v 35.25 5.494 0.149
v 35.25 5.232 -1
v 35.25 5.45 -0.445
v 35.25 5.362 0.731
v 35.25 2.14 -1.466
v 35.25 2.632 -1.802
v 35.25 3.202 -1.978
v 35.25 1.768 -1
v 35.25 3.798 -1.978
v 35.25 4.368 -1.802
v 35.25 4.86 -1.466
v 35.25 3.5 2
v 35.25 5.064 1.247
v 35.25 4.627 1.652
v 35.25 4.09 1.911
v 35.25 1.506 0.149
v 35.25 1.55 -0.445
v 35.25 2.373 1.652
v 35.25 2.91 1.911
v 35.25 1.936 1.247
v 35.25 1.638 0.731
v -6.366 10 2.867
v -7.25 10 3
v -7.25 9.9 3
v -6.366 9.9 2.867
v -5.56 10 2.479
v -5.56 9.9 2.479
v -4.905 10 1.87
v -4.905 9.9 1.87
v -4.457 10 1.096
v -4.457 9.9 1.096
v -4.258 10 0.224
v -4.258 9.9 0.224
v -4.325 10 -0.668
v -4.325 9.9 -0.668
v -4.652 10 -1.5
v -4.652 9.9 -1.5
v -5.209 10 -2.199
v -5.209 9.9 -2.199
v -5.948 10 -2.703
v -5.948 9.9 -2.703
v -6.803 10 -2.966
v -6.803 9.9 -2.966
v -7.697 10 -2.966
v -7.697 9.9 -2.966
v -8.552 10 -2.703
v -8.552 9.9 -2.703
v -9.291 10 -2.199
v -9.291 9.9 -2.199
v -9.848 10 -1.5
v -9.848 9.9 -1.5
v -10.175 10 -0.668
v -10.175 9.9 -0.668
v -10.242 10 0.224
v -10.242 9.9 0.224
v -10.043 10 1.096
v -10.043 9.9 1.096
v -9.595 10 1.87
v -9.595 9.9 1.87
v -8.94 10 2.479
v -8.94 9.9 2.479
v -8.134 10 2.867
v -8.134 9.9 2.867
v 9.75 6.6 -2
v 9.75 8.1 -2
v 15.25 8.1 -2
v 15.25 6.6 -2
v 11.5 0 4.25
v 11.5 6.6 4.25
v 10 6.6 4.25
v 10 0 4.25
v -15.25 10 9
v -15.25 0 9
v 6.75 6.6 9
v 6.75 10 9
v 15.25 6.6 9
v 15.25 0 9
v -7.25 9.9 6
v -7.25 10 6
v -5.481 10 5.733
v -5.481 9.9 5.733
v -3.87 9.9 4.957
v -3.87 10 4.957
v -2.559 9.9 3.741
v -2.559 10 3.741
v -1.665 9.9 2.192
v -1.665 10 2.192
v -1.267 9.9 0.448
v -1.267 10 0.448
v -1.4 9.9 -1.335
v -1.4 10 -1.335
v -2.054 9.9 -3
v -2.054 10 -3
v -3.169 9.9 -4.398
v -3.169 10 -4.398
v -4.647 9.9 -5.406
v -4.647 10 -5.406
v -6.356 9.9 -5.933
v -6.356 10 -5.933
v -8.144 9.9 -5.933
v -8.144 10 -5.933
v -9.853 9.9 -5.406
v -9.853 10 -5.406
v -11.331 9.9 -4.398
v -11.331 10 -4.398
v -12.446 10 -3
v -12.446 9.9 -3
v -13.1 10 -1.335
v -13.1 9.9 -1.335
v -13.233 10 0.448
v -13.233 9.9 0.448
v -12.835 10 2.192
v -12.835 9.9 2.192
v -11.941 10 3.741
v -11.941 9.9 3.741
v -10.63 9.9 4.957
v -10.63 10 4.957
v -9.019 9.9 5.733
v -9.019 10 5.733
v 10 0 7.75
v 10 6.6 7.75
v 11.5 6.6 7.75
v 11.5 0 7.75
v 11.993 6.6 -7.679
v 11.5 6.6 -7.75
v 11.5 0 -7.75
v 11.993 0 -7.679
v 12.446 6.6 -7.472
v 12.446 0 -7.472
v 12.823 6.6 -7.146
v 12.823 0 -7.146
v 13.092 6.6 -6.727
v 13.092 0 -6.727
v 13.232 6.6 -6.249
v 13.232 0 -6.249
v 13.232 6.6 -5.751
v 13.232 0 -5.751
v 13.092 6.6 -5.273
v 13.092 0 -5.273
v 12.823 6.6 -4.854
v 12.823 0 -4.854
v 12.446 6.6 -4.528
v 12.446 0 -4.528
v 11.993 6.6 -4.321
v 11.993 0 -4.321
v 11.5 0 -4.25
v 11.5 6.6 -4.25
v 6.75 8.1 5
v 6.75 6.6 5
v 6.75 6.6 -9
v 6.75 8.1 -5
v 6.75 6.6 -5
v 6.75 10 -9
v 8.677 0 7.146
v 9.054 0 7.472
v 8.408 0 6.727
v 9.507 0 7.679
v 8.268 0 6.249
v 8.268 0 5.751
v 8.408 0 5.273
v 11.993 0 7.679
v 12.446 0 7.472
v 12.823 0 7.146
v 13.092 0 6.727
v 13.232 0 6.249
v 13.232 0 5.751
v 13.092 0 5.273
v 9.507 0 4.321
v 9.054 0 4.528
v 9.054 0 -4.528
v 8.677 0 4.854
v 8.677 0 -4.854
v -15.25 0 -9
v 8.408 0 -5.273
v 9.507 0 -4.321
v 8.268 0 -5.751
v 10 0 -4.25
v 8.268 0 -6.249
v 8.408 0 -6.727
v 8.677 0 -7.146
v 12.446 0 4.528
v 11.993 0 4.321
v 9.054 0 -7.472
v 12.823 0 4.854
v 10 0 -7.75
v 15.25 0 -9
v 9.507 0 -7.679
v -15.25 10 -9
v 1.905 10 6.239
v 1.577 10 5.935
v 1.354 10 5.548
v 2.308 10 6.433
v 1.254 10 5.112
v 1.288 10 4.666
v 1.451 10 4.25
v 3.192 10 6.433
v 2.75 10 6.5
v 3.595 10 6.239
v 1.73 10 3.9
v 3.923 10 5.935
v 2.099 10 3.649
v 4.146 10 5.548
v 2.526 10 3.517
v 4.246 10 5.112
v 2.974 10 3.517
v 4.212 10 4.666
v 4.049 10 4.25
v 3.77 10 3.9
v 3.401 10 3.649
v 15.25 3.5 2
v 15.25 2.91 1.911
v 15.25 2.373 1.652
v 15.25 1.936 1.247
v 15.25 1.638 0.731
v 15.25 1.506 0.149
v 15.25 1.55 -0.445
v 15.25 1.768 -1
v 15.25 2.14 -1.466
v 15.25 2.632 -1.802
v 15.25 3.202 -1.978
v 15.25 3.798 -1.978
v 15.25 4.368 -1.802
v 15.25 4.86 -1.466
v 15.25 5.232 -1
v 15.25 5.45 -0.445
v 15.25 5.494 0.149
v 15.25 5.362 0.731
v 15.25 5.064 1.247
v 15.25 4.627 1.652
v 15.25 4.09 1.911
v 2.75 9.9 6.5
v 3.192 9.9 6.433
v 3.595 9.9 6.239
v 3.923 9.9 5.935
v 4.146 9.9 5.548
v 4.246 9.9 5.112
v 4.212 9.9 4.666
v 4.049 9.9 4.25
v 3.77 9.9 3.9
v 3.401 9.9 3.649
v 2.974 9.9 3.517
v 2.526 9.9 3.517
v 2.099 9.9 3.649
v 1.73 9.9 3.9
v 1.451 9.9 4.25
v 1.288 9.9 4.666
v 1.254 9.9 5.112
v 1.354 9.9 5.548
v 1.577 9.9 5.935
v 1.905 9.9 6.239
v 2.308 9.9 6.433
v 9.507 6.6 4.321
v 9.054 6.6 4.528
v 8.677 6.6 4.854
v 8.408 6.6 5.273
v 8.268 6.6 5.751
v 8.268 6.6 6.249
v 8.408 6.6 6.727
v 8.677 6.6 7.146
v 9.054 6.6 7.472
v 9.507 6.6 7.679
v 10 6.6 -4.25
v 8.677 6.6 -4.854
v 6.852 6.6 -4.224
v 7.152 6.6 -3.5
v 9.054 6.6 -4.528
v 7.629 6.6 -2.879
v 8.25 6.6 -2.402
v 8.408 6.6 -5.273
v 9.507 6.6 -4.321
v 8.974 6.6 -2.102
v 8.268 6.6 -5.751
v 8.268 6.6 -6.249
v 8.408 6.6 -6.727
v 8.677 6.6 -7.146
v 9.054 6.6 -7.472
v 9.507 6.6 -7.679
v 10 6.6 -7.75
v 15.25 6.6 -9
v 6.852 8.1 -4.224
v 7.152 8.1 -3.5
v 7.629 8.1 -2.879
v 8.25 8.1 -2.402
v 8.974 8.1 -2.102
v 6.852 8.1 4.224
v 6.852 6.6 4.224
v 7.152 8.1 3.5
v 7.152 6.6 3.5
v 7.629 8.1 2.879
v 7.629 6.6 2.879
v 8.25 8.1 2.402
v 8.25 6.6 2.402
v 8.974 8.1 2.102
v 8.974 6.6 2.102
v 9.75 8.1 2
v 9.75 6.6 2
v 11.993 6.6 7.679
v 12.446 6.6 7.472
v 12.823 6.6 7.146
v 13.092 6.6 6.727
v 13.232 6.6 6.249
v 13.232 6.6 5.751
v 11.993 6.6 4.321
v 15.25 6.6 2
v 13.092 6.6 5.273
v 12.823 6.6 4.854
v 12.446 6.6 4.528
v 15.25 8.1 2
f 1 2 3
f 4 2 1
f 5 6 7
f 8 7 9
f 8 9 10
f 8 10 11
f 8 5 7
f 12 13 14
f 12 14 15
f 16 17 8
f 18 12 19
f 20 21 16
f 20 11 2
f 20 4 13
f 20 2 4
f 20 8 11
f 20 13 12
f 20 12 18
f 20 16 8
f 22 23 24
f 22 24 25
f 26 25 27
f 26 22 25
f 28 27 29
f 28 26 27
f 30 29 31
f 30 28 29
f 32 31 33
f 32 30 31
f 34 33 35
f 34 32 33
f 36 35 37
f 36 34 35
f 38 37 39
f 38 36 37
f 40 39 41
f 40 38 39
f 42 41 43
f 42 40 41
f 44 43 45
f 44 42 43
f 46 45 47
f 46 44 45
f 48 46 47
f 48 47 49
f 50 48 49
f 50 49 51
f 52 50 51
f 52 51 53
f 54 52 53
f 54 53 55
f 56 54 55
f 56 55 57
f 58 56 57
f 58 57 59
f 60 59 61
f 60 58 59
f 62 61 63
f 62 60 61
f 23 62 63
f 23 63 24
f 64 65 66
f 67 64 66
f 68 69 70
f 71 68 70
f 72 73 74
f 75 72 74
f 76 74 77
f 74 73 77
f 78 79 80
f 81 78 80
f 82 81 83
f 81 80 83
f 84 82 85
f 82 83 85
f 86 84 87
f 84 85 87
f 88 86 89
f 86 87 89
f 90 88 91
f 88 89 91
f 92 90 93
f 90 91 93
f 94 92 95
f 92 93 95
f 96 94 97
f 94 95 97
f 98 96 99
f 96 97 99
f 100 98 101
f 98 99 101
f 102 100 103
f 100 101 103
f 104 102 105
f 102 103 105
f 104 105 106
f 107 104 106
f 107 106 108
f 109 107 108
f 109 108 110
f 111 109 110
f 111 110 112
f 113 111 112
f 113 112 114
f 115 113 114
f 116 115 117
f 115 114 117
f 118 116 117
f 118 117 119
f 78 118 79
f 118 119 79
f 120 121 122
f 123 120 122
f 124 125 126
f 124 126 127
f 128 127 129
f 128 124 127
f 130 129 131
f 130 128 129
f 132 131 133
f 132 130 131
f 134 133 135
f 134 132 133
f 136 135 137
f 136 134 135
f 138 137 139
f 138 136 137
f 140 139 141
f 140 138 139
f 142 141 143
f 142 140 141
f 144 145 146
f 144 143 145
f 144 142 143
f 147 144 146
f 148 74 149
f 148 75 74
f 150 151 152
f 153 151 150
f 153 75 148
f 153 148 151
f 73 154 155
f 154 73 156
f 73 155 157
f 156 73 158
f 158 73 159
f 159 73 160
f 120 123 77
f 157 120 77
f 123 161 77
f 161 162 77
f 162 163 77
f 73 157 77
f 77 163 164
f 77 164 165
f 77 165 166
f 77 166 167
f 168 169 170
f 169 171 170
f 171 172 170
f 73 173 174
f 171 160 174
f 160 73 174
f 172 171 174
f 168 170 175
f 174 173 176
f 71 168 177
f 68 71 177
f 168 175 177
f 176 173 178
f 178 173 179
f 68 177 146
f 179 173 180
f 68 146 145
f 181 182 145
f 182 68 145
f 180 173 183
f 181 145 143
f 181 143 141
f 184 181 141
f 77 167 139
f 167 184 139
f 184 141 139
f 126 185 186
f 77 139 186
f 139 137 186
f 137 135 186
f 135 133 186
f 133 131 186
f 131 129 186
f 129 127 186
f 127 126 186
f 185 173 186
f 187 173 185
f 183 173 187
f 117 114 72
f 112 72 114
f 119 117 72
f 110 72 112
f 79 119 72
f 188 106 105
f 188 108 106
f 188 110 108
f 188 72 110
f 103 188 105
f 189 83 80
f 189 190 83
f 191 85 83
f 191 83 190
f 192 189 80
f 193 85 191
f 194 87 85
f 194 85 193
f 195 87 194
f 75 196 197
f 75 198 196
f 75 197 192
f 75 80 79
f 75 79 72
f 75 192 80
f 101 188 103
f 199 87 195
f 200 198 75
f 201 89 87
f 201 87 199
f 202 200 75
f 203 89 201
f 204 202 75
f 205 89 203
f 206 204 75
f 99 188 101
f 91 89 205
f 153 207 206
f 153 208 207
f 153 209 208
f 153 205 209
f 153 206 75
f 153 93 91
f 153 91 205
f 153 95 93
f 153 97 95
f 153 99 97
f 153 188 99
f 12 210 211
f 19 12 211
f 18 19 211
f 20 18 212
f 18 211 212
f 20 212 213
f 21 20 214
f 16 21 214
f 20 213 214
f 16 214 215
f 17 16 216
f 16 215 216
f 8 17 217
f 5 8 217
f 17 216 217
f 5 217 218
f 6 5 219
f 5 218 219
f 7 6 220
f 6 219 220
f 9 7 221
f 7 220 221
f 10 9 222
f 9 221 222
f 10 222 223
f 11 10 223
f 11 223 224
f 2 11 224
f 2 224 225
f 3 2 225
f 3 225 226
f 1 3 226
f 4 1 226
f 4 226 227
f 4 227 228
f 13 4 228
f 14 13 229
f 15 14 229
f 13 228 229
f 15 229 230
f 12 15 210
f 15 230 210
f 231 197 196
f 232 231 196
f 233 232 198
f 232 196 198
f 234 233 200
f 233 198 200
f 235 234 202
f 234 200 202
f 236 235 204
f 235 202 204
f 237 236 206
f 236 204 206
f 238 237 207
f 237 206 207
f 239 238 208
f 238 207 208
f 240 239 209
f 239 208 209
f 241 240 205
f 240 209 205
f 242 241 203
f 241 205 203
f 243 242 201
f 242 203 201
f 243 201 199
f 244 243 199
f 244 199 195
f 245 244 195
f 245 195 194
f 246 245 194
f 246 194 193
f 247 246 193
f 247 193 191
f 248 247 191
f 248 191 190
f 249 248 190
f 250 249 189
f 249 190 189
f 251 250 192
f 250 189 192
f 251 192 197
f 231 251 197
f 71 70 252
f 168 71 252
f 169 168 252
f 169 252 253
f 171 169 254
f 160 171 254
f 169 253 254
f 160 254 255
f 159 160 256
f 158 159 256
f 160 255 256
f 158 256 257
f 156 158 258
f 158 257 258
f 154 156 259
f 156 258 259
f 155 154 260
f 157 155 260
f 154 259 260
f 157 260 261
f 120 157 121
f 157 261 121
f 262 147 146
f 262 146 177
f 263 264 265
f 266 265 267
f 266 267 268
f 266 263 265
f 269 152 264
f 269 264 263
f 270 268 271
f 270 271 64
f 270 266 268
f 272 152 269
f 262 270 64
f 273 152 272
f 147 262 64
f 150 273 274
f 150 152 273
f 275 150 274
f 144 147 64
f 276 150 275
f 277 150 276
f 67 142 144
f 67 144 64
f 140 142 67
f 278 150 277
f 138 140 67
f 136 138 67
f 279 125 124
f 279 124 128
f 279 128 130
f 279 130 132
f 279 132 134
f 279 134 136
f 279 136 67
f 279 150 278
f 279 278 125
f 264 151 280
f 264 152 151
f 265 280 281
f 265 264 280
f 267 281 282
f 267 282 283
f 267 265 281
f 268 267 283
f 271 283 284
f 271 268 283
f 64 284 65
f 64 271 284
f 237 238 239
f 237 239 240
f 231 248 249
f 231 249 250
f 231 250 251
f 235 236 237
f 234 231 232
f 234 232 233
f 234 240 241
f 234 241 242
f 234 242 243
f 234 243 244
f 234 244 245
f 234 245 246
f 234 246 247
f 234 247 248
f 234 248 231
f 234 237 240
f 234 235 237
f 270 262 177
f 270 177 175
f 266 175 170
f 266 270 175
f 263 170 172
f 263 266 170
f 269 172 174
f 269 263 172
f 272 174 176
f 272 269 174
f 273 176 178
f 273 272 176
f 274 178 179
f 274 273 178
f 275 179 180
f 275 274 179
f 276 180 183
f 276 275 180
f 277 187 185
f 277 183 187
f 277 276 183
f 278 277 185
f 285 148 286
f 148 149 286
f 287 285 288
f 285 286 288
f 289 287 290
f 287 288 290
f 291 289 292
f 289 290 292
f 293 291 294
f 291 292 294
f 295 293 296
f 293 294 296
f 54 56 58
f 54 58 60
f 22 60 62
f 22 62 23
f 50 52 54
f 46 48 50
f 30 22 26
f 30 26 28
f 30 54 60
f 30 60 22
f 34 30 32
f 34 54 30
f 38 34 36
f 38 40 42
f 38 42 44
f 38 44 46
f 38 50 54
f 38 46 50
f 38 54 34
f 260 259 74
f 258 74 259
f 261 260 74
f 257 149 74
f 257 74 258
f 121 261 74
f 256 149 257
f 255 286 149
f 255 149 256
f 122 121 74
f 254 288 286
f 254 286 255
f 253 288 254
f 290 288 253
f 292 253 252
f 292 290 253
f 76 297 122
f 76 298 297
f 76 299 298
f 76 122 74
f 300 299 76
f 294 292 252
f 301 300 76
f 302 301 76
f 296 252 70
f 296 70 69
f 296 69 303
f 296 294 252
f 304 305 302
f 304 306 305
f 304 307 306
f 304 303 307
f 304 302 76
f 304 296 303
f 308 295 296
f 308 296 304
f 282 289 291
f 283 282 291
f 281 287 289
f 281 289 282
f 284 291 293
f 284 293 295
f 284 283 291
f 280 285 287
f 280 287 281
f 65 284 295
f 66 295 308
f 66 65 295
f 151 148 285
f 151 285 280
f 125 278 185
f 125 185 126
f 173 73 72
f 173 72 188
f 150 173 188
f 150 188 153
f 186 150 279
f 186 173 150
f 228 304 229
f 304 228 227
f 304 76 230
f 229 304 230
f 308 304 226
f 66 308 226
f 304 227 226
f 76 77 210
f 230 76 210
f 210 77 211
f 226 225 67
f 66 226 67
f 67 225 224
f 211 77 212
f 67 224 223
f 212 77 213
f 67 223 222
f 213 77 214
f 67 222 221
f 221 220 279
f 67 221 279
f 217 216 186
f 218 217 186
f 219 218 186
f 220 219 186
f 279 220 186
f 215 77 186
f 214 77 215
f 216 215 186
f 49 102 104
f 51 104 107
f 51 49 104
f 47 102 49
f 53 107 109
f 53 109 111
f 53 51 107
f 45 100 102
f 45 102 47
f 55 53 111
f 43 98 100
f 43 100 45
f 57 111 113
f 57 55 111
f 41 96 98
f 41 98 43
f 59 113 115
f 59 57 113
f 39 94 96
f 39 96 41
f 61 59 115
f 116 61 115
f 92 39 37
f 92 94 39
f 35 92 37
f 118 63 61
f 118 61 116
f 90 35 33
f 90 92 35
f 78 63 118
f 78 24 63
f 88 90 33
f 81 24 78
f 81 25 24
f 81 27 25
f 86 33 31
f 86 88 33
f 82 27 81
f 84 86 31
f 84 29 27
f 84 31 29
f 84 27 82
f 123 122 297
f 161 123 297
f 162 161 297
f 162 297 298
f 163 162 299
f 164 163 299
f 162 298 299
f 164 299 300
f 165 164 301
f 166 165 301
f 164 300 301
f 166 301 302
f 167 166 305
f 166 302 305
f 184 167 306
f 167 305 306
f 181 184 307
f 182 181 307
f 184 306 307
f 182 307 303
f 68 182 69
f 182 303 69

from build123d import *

# Parameters (mm, degrees)
ESQUISSE2_W             = 30.5
ESQUISSE2_H             = 18
BOSS_EXTRU_1_DEPTH      = 10
ESQUISSE3_W             = 8.5
ESQUISSE3_H             = 7
ENL_V_MAT_EXTRU_1_DEPTH = 3.4
ENL_V_MAT_EXTRU_2_DEPTH = 19.897685043
ESQUISSE7_W             = 8.5
ESQUISSE7_H             = 4
ENL_V_MAT_EXTRU_4_DEPTH = 1.9
CONG_1_R                = 3
ESQUISSE5_R             = 6
ESQUISSE5_R_2           = 3
ESQUISSE5_R_3           = 1.5
ENL_V_MAT_EXTRU_3_DEPTH = 0.1
ESQUISSE6_R             = 2
BOSS_EXTRU_2_DEPTH      = 20


with BuildPart() as part:
    # Esquisse2 → Boss.-Extru.1 (new body)
    with BuildSketch(Plane(origin=(0, 0, 0), x_dir=(1, 0, 0), z_dir=(0, 1, 0))):
        Rectangle(ESQUISSE2_W, ESQUISSE2_H)
    extrude(amount=BOSS_EXTRU_1_DEPTH)

    # Esquisse3 → Enlèv. mat.-Extru.1 (cut)
    with BuildSketch(Plane(origin=(0, 10, 0), x_dir=(1, 0, 0), z_dir=(0, 1, 0))):
        with Locations((11, -5.5)):
            Rectangle(ESQUISSE3_W, ESQUISSE3_H)
        with Locations((11, 5.5)):
            Rectangle(ESQUISSE3_W, ESQUISSE3_H)
    extrude(amount=-ENL_V_MAT_EXTRU_1_DEPTH, mode=Mode.SUBTRACT)

    # Esquisse4 → Enlèv. mat.-Extru.2 (cut, through all)
    with BuildSketch(Plane(origin=(0, 6.6, 0), x_dir=(1, 0, 0), z_dir=(0, 1, 0))):
        with BuildLine():
            Line((10, 7.75), (11.5, 7.75))
            ThreePointArc((11.5, 7.75), (13.25, 6), (11.5, 4.25))
            Line((11.5, 4.25), (10, 4.25))
            ThreePointArc((10, 4.25), (8.25, 6), (10, 7.75))
        make_face()
        with BuildLine():
            Line((10, -7.75), (11.5, -7.75))
            ThreePointArc((11.5, -7.75), (13.25, -6), (11.5, -4.25))
            Line((11.5, -4.25), (10, -4.25))
            ThreePointArc((10, -4.25), (8.25, -6), (10, -7.75))
        make_face()
    extrude(amount=-ENL_V_MAT_EXTRU_2_DEPTH, mode=Mode.SUBTRACT)

    # Esquisse7 → Enlèv. mat.-Extru.4 (cut)
    with BuildSketch(Plane(origin=(0, 10, 0), x_dir=(1, 0, 0), z_dir=(0, 1, 0))):
        with Locations((11, 0)):
            Rectangle(ESQUISSE7_W, ESQUISSE7_H)
    extrude(amount=-ENL_V_MAT_EXTRU_4_DEPTH, mode=Mode.SUBTRACT)

    # Congé1
    cong_1_edges = [part.edges().sort_by_distance(p)[0] for p in [
        (6.75, 7.35, 2),
        (6.75, 7.35, -2),
    ]]
    fillet(cong_1_edges, radius=CONG_1_R)

    # Esquisse5 → Enlèv. mat.-Extru.3 (cut)
    # profile 1 of 2: a face of its own
    with BuildSketch(Plane(origin=(0, 10, 0), x_dir=(1, 0, 0), z_dir=(0, 1, 0))):
        with Locations(Location((-7.25, 0, 0), (0, 0, 270))):
            Circle(ESQUISSE5_R)
        with Locations(Location((-7.25, 0, 0), (0, 0, 270))):
            Circle(ESQUISSE5_R_2, mode=Mode.SUBTRACT)
    # profile 2 of 2: a face of its own
    with BuildSketch(Plane(origin=(0, 10, 0), x_dir=(1, 0, 0), z_dir=(0, 1, 0))):
        with Locations(Location((2.75, -5, 0), (0, 0, 270))):
            Circle(ESQUISSE5_R_3)
    extrude(amount=-ENL_V_MAT_EXTRU_3_DEPTH, mode=Mode.SUBTRACT)

    # Esquisse6 → Boss.-Extru.2 (add)
    with BuildSketch(Plane(origin=(15.25, 0, 0), x_dir=(0, 0, -1), z_dir=(1, 0, 0))):
        with Locations(Location((0, 3.5, 0), (0, 0, 180))):
            Circle(ESQUISSE6_R)
    extrude(amount=BOSS_EXTRU_2_DEPTH)


solid = part.part
